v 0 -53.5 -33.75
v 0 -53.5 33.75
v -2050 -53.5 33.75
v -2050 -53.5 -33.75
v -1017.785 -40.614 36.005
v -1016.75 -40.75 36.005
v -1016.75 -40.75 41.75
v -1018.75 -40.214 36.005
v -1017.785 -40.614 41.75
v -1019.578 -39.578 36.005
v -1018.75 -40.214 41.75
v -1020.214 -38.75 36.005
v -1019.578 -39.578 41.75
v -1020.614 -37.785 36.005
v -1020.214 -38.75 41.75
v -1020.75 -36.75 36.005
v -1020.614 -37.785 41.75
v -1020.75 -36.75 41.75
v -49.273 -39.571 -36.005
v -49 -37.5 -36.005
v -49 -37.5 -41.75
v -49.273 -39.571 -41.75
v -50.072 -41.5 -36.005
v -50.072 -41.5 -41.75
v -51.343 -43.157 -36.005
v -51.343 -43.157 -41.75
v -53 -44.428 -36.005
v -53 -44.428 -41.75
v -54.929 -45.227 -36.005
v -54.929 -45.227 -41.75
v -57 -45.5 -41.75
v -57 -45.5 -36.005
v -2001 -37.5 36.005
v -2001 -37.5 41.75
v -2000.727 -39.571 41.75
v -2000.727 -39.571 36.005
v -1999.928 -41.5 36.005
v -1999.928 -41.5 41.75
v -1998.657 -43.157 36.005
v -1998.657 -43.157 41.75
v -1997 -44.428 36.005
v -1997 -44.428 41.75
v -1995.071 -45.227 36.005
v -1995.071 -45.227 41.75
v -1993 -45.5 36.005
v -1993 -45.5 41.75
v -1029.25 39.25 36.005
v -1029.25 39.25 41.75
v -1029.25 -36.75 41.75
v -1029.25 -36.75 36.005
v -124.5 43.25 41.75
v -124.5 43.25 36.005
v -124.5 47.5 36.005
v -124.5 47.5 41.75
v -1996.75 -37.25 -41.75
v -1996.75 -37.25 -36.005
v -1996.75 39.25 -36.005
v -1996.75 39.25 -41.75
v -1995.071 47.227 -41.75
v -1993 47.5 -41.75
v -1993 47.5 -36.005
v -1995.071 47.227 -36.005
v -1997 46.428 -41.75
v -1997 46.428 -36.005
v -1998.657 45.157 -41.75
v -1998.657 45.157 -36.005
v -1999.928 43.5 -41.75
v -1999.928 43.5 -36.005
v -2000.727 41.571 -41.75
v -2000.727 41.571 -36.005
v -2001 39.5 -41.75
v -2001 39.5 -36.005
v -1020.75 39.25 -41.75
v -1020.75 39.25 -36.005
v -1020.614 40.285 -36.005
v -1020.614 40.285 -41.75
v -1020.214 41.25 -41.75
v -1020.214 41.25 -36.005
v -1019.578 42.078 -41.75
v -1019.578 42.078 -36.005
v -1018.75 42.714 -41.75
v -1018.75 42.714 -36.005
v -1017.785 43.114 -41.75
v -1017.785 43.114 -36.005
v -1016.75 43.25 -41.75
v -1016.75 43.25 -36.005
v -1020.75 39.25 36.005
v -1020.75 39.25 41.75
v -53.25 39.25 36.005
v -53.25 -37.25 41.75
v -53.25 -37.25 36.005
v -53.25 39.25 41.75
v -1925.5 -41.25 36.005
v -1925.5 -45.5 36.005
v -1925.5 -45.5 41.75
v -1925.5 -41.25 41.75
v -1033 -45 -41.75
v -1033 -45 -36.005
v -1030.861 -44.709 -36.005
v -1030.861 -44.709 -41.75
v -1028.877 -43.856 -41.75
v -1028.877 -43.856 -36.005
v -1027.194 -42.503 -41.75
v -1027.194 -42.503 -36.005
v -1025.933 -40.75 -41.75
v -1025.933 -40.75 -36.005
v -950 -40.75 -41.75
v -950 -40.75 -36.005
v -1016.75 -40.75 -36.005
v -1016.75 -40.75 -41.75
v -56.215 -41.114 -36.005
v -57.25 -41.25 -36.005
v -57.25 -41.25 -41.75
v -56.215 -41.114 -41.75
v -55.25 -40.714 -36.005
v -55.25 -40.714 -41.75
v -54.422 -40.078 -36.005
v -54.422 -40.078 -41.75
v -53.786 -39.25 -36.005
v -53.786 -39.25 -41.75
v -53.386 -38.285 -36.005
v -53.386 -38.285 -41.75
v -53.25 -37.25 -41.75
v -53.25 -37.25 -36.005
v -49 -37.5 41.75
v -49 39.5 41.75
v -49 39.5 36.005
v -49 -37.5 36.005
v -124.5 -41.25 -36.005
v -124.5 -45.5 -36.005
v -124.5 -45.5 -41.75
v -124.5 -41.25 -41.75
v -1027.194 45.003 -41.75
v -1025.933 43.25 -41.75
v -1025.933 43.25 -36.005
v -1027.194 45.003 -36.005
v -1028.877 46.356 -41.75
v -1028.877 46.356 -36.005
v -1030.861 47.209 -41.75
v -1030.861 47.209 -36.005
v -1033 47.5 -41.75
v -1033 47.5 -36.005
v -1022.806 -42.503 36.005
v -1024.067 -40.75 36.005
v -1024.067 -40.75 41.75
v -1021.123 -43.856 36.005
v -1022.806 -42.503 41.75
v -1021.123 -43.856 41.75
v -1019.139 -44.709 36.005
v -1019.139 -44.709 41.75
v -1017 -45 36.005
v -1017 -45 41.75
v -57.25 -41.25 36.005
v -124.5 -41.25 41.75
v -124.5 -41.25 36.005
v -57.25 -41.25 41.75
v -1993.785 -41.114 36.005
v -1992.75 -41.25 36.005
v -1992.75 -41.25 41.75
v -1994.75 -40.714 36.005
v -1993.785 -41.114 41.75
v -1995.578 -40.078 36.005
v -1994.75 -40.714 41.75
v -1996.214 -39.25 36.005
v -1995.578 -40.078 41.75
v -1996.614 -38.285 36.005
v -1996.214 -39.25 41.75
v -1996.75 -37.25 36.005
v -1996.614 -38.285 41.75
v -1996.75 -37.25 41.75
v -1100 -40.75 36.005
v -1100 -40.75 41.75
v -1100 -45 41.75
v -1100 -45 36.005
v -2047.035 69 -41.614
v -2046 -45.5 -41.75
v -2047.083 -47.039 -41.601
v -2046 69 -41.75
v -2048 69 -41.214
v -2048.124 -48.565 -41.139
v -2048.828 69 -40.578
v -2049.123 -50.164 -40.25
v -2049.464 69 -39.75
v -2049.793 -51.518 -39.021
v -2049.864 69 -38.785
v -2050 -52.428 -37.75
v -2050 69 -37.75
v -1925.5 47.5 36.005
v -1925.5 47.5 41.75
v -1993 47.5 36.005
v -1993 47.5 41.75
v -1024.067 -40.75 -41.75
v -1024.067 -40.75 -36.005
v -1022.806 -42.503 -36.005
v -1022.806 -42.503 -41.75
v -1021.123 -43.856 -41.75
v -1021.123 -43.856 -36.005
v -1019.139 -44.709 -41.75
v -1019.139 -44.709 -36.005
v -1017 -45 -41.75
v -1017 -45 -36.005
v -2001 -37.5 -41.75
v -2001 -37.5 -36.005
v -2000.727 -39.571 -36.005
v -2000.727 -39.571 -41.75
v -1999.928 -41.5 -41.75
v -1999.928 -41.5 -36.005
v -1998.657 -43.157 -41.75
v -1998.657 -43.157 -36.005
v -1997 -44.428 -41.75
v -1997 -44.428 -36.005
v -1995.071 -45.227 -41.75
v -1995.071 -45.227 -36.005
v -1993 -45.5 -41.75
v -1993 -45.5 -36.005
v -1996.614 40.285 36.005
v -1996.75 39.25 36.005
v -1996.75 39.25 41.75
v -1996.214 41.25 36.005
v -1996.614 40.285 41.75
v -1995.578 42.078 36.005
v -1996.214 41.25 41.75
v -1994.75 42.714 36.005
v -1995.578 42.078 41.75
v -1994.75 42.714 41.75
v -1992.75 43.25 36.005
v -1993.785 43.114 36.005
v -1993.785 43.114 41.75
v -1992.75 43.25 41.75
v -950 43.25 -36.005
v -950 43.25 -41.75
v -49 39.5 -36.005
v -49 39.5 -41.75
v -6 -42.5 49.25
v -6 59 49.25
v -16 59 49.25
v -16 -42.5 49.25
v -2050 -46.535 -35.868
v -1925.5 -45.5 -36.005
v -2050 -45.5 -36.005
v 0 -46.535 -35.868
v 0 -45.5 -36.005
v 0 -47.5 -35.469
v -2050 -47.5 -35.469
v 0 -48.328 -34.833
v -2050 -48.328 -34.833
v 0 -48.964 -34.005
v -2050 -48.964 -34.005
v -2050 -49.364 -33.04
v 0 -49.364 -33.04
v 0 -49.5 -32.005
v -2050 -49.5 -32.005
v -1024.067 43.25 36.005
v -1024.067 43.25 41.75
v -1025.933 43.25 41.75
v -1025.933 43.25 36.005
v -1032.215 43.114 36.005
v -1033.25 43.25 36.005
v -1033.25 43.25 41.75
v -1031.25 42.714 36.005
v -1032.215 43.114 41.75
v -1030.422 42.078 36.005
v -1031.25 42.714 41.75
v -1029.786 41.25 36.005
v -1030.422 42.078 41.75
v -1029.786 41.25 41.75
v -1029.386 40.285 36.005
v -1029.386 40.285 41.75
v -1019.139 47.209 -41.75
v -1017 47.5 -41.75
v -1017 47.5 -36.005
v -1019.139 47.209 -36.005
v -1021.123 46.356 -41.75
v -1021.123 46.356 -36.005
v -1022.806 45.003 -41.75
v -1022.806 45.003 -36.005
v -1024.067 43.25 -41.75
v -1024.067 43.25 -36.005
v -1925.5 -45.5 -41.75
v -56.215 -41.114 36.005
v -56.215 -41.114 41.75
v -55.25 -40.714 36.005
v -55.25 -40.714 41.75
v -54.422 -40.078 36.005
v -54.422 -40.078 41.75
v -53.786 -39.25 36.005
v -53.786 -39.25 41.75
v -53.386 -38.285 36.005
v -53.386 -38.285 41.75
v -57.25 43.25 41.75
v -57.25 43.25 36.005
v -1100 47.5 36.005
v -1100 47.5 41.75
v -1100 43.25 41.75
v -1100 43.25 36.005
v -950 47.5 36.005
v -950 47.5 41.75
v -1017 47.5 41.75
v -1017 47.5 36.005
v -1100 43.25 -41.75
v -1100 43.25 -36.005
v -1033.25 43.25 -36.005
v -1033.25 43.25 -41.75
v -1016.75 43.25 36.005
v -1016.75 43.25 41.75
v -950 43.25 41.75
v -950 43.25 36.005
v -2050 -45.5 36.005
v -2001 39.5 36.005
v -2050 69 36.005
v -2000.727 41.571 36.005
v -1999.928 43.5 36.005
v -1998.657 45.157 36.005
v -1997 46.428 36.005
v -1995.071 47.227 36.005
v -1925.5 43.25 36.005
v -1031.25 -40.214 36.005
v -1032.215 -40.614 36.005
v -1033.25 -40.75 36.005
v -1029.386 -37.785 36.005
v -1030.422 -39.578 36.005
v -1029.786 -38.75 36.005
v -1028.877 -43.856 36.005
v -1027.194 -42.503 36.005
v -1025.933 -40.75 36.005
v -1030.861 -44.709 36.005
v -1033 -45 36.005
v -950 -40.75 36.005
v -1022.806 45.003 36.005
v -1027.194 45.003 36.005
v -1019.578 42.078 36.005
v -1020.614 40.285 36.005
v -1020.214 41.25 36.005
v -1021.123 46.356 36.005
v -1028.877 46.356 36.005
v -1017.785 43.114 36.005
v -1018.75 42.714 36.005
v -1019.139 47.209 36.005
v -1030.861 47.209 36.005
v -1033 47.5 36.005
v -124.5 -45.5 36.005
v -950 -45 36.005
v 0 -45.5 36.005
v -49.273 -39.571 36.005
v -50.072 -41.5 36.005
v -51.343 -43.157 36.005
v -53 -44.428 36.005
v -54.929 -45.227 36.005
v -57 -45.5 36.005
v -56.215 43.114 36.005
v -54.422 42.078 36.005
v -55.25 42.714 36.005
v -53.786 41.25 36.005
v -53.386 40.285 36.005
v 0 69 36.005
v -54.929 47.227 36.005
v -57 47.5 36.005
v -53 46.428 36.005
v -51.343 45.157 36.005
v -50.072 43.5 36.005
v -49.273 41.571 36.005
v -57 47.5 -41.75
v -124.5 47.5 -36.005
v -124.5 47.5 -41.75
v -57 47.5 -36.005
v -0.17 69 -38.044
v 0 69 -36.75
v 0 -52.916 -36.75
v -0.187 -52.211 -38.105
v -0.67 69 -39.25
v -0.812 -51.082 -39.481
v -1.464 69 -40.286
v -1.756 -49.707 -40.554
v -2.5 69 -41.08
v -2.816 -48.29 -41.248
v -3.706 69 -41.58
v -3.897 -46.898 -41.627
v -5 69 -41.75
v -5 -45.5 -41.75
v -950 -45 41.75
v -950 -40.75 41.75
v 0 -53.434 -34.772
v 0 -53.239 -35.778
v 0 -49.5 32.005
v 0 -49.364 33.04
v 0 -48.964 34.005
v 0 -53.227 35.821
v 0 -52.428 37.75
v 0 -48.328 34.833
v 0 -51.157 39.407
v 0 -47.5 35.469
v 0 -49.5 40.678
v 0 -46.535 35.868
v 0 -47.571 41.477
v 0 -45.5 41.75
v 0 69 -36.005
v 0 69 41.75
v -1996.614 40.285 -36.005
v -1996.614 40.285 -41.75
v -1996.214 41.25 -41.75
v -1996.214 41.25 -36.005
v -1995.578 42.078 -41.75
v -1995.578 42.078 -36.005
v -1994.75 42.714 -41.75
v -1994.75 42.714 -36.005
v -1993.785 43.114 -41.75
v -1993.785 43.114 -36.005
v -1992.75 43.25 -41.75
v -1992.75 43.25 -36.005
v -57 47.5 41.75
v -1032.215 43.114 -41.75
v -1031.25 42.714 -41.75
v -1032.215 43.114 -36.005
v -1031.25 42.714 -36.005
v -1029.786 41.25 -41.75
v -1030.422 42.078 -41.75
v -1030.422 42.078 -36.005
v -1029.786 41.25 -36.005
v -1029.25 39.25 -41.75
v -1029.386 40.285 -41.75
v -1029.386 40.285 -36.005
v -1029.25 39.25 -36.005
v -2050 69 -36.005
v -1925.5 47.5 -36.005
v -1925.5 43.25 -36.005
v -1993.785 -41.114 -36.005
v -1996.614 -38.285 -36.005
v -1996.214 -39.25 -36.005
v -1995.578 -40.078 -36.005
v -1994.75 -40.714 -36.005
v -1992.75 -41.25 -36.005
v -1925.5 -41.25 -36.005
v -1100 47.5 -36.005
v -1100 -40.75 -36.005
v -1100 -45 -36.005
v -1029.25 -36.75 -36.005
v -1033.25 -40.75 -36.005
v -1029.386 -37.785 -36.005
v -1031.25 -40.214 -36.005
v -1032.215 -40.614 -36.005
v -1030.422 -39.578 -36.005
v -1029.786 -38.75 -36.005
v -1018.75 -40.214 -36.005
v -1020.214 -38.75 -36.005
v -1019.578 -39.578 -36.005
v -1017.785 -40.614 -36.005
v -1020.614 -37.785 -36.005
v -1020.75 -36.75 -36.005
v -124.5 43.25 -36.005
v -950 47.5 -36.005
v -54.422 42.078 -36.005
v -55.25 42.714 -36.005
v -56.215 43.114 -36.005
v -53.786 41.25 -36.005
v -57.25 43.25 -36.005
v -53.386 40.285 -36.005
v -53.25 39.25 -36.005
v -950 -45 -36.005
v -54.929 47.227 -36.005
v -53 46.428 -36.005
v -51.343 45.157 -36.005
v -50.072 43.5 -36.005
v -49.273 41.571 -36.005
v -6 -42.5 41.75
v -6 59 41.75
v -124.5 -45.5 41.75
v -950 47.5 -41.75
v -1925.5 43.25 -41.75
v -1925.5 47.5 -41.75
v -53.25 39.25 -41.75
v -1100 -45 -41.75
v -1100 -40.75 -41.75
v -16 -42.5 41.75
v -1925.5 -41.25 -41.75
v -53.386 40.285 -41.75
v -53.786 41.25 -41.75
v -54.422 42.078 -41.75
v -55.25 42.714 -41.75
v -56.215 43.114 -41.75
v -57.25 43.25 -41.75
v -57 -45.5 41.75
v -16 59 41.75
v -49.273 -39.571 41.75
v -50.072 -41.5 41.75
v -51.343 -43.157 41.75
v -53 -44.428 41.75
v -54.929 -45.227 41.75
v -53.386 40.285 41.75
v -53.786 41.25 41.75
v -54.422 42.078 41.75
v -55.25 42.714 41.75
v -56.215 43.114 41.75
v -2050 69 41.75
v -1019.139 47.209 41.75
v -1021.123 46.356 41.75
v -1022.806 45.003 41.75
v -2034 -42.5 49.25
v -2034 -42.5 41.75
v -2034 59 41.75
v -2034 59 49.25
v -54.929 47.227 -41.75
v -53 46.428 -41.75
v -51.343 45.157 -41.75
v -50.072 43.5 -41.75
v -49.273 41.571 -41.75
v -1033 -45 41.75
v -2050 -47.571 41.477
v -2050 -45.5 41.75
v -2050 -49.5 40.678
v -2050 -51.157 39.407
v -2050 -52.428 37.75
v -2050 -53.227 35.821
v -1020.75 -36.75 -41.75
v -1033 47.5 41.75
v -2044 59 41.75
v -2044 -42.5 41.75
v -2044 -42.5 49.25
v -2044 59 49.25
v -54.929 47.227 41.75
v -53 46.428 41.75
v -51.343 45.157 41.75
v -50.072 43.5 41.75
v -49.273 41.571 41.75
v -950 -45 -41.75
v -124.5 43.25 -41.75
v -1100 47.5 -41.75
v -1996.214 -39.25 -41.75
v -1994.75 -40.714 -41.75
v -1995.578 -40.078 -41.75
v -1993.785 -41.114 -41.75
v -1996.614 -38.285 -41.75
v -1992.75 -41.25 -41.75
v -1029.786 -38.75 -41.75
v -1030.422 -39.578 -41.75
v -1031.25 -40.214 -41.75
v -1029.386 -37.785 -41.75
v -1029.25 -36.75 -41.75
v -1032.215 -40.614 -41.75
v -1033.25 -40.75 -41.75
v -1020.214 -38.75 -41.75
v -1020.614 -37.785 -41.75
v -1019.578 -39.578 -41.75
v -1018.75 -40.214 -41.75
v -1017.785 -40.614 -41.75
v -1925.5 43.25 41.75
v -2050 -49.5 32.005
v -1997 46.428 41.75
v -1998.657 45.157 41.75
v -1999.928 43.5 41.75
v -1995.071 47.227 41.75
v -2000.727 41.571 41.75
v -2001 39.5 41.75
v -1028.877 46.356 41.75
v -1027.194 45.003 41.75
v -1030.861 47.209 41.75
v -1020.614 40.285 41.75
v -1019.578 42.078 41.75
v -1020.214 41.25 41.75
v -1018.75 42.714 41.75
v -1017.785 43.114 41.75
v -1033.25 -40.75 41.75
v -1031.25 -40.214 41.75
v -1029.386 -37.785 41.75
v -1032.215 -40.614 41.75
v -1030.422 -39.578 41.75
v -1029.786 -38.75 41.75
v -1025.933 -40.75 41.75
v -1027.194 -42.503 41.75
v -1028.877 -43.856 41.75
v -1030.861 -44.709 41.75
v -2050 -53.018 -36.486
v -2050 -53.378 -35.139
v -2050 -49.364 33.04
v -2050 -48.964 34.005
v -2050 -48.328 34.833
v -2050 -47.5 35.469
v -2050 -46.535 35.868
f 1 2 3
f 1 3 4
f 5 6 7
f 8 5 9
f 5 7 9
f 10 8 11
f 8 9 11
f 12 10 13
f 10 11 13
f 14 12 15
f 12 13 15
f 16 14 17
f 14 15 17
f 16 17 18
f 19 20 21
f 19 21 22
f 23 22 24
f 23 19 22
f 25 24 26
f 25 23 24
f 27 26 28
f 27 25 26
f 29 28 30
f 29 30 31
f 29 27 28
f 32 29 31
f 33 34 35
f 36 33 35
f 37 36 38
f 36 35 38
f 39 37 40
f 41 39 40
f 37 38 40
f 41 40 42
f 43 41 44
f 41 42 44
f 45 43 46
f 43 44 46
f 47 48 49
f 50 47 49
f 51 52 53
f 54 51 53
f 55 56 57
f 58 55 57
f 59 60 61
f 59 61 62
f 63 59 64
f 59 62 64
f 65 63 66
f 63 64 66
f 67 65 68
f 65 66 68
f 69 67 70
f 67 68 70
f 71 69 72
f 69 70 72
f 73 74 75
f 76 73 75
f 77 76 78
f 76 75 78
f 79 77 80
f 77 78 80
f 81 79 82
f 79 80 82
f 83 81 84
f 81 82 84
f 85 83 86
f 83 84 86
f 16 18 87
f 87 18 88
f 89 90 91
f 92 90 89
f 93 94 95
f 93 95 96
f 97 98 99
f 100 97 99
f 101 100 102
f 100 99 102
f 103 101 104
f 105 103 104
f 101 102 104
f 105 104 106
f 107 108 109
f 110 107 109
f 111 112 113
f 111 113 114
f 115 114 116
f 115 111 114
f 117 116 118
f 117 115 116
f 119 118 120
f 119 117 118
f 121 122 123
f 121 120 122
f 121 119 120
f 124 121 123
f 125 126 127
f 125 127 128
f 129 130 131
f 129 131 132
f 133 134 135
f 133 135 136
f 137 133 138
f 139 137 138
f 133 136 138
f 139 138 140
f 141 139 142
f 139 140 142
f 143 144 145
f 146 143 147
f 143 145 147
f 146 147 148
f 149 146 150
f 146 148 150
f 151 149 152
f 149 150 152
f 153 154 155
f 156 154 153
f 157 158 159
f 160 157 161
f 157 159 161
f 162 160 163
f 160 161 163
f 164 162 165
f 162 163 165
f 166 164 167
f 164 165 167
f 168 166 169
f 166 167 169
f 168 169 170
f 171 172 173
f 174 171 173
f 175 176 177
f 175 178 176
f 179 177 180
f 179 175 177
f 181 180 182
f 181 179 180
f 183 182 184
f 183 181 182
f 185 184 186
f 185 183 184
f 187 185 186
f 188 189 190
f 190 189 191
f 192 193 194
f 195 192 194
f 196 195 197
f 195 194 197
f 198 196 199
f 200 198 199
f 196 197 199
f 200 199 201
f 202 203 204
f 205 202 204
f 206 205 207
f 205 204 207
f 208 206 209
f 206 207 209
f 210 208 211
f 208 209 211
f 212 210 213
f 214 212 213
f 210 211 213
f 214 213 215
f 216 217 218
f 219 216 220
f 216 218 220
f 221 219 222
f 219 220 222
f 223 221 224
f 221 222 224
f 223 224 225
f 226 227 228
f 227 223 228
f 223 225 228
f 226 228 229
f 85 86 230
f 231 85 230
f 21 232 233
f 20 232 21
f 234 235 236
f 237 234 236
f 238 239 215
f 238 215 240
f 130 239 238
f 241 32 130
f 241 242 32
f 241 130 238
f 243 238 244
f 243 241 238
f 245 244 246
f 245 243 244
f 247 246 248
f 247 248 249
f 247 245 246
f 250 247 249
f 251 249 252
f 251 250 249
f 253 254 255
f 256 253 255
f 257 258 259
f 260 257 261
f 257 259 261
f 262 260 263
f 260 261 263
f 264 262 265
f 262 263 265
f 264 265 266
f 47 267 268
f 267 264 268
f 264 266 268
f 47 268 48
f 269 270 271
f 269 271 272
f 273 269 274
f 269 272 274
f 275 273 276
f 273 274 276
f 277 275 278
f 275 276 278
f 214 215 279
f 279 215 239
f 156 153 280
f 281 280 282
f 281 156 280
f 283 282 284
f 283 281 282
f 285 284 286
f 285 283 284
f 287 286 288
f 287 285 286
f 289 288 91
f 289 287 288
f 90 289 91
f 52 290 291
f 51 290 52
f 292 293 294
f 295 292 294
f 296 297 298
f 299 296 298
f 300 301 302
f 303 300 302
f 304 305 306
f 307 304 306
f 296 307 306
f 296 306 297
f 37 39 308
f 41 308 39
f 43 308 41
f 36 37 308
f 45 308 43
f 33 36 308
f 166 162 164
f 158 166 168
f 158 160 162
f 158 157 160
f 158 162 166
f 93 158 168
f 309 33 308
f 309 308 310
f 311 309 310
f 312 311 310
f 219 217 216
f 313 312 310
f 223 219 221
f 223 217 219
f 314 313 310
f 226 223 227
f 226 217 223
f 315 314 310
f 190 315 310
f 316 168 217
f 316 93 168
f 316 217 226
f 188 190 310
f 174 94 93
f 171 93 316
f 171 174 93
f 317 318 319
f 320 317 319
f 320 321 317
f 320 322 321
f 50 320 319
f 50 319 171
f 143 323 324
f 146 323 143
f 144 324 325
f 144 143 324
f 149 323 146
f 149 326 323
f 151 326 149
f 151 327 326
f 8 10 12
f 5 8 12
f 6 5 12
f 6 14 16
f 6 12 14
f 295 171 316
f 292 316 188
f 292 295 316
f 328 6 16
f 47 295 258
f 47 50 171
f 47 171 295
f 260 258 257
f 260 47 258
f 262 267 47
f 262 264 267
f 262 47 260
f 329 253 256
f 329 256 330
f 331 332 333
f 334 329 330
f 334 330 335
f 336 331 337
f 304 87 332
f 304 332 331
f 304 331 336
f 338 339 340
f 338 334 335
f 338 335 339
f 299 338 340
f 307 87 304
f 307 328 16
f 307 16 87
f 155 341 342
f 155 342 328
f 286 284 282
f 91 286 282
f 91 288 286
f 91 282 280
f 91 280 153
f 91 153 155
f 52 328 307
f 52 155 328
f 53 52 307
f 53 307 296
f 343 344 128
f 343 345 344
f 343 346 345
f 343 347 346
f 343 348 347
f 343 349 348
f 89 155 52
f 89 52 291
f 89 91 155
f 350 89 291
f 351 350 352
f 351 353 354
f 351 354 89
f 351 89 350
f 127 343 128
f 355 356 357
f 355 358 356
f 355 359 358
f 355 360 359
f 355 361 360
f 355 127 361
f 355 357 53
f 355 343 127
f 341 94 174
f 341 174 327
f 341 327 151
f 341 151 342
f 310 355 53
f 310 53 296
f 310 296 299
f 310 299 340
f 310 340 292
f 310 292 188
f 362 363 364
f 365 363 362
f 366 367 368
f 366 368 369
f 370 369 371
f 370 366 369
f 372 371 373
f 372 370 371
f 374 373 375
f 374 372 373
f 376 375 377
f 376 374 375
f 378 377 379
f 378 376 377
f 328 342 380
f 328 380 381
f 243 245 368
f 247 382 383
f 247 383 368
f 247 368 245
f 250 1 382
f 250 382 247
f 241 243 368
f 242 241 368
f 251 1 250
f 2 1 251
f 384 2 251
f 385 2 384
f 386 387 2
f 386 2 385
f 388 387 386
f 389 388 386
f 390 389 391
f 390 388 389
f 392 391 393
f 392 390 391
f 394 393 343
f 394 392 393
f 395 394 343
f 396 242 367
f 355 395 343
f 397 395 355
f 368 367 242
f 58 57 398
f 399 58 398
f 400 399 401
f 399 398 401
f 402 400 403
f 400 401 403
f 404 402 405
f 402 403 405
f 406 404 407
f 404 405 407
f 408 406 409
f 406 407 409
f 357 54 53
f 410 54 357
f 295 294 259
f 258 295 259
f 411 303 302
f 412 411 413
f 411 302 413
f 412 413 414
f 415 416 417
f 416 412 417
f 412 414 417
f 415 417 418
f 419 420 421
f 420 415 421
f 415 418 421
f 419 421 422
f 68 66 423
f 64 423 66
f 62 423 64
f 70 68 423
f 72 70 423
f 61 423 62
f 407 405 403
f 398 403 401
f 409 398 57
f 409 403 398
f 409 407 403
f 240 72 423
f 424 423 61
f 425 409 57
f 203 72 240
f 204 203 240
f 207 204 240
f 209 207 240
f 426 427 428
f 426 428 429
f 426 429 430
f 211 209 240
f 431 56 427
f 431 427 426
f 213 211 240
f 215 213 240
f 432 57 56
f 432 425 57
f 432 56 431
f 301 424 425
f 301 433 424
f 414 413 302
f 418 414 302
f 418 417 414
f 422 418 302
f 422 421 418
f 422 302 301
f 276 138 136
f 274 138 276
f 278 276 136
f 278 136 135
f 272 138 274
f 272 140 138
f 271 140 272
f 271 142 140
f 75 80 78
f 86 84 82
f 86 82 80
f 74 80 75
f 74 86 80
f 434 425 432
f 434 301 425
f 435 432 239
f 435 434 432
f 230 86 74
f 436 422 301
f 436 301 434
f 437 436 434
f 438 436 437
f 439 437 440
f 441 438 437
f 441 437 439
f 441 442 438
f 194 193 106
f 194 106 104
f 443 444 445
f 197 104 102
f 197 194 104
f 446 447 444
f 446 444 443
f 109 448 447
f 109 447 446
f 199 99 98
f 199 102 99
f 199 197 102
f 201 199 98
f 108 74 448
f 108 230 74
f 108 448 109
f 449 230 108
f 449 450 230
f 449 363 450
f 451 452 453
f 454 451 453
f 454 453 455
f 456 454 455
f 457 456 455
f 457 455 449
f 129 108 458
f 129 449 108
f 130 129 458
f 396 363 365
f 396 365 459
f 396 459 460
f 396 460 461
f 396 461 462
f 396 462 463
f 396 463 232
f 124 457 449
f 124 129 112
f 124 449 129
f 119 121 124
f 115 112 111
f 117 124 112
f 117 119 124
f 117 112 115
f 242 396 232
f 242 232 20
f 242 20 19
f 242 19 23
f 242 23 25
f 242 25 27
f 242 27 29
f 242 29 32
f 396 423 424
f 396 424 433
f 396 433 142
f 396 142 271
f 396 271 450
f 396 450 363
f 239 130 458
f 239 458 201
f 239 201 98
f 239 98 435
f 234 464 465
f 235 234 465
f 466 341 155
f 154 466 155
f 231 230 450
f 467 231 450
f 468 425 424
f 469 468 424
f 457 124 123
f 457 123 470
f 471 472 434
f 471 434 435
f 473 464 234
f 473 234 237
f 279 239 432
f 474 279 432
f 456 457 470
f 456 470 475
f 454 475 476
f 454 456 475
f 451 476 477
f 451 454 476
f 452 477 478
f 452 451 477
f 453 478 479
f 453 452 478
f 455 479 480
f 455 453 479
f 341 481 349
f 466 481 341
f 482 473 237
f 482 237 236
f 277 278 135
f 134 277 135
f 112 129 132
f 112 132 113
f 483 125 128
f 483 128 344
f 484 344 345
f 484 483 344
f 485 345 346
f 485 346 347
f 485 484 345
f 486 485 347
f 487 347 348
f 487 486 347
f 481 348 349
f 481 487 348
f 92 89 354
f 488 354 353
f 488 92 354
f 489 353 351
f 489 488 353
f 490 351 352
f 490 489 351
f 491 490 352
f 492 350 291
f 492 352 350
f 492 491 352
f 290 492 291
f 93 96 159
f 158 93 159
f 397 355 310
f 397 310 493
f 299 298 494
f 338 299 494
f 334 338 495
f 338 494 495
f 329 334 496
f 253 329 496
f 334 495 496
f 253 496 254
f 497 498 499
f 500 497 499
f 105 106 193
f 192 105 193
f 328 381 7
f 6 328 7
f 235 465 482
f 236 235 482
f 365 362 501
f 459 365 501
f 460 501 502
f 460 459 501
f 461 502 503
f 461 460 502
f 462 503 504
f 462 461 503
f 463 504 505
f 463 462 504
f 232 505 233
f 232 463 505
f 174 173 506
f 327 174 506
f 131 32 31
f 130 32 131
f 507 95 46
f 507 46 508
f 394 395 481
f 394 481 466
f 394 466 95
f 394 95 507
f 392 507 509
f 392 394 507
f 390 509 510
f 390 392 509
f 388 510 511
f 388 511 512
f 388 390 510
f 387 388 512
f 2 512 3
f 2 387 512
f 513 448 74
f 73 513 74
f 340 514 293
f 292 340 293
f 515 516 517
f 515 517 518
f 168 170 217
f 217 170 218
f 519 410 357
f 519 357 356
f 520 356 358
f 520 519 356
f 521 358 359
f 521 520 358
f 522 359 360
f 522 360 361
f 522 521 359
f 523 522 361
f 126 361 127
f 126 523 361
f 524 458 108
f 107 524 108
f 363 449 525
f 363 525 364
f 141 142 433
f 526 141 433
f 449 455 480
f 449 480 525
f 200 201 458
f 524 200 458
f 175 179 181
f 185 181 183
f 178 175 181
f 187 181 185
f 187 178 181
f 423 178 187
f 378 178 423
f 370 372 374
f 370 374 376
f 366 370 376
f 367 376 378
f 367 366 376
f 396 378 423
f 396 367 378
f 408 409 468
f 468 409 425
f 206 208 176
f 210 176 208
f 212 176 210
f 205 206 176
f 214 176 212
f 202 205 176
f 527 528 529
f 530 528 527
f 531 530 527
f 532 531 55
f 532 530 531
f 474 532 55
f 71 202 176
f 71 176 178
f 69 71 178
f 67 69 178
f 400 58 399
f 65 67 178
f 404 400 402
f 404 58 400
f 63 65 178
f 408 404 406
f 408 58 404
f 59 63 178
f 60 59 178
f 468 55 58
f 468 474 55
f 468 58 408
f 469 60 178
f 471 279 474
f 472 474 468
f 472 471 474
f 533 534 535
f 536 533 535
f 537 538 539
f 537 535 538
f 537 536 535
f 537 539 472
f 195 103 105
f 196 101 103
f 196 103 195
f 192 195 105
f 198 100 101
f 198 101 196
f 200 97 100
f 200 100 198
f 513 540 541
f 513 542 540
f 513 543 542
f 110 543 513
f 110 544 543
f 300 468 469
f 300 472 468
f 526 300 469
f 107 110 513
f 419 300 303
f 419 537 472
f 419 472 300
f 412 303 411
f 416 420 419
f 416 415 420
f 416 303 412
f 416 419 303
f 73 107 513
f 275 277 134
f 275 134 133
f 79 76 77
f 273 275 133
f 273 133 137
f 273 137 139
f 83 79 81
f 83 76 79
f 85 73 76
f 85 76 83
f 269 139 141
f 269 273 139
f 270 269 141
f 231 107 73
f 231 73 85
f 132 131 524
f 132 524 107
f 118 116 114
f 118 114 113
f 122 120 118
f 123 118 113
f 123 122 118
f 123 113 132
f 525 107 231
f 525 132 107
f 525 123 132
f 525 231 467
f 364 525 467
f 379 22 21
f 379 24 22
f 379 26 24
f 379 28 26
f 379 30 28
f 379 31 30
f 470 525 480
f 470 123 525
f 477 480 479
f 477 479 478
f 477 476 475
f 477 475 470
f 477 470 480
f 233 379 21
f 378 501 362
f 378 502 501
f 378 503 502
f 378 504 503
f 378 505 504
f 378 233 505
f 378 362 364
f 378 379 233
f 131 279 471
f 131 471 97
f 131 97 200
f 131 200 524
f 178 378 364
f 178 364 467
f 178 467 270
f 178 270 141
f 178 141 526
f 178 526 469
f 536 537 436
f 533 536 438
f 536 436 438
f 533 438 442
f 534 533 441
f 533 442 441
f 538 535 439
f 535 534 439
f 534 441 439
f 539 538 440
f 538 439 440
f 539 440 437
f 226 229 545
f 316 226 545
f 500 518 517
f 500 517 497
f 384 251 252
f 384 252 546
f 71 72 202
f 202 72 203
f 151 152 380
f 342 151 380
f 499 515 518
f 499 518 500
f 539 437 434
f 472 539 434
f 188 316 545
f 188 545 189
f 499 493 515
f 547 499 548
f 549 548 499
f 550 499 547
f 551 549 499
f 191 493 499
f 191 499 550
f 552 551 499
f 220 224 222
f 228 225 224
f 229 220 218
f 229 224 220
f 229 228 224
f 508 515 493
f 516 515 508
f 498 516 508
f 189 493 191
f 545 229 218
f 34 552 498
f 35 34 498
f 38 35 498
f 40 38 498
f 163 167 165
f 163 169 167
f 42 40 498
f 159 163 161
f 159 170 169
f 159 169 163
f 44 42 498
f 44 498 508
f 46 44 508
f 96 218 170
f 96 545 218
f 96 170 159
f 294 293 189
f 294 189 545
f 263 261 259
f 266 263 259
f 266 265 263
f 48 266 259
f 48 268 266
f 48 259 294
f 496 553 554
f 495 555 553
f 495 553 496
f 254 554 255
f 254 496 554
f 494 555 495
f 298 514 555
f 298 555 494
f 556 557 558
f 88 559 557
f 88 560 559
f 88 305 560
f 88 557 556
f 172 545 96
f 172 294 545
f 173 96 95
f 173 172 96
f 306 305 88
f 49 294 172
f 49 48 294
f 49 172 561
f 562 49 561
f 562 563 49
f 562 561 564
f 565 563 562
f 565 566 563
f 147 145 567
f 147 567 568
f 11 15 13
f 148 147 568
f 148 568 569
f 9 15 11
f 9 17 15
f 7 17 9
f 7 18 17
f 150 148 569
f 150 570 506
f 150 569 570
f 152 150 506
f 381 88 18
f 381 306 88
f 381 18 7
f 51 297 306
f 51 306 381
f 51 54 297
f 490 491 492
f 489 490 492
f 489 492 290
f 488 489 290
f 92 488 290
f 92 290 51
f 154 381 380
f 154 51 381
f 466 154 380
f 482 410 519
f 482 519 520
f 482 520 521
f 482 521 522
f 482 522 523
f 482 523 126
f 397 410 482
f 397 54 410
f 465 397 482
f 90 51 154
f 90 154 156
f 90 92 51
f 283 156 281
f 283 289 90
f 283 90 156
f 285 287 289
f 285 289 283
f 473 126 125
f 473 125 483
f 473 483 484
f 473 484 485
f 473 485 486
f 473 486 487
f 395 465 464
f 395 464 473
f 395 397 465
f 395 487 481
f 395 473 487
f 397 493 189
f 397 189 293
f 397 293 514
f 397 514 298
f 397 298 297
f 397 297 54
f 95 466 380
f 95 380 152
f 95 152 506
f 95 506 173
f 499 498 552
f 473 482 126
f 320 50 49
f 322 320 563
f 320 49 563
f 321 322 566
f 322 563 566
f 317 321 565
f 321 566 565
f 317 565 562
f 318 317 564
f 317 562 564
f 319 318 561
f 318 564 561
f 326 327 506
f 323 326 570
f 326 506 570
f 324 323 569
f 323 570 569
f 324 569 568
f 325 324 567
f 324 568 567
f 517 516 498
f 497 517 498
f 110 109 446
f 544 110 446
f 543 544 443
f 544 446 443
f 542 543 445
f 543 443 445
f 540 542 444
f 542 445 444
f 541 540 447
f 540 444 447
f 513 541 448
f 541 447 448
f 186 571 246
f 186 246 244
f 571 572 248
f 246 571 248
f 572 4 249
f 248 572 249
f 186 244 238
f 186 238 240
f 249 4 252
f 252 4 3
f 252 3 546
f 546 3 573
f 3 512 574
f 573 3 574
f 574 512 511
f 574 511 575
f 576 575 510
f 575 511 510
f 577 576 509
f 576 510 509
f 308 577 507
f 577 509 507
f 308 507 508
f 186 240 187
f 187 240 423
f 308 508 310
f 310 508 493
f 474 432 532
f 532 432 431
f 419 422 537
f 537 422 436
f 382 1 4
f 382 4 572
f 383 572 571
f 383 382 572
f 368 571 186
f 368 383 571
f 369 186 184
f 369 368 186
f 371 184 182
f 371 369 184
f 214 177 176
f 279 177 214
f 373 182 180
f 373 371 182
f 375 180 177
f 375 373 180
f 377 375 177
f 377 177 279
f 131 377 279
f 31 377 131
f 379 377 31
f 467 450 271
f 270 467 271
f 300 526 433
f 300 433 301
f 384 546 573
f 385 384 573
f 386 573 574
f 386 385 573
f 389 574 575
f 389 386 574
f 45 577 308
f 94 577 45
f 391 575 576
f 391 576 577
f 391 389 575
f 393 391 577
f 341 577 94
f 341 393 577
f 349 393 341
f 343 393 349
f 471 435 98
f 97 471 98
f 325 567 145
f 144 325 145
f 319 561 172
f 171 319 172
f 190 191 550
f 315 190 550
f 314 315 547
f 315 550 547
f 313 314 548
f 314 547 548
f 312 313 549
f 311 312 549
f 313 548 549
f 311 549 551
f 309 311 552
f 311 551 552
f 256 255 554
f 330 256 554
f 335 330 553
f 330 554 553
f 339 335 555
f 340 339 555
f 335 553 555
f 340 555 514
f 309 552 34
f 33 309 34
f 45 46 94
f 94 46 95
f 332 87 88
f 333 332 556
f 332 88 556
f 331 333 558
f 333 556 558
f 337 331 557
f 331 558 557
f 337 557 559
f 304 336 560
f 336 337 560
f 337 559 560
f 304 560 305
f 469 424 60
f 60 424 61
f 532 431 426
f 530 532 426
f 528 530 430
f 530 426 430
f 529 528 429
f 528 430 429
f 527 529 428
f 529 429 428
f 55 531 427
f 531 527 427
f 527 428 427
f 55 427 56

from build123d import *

# Parameters (mm, degrees)
F0_W         = 69
F0_H         = 5.7454954955
F1_DEPTH     = 2050
F2_W         = 10
F2_H         = 101.5
F3_DEPTH     = 7.5
F7_DEPTH     = 84
F10_DEPTH    = 90
F11_T1_DEPTH = 134.5
F12_T1_DEPTH = 139.5


# Not quite as in the source:
# - a fillet or chamfer that OpenCascade refuses, or shapes differently, is made with other operations: its cross-section is extruded or revolved along the edge and cut away or added


with BuildPart() as f1:
    # F0 (on Right) → F1 (new body)
    with BuildSketch(Plane.YZ):
        with BuildLine():
            ThreePointArc((-53.5, -33.75), (-51.1568542495, -39.4068542495), (-45.5, -41.75))
            Line((-45.5, -41.75), (0, -41.75))
            Line((0, -41.75), (0, -36.0045045045))
            Line((0, -36.0045045045), (-45.5, -36.0045045045))
            ThreePointArc((-45.5, -36.0045045045), (-48.3284271247, -34.8329316293), (-49.5, -32.0045045045))
            Line((-49.5, -32.0045045045), (-49.5, 32.0045045045))
            ThreePointArc((-49.5, 32.0045045045), (-48.3284271247, 34.8329316293), (-45.5, 36.0045045045))
            Line((-45.5, 36.0045045045), (0, 36.0045045045))
            Line((0, 36.0045045045), (0, 41.75))
            Line((0, 41.75), (-45.5, 41.75))
            ThreePointArc((-45.5, 41.75), (-51.1568542495, 39.4068542495), (-53.5, 33.75))
            Line((-53.5, 33.75), (-53.5, -33.75))
        make_face()
        with Locations((34.5, 38.8772522523)):
            Rectangle(F0_W, F0_H)
        with Locations((34.5, -38.8772522523)):
            Rectangle(F0_W, F0_H)
    extrude(amount=-F1_DEPTH)

    # F2 (on face) → F3 (join)
    with BuildSketch(Plane.XY.offset(41.75)):
        with Locations((-2039, 8.25)):
            Rectangle(F2_W, F2_H)
    extrude(amount=F3_DEPTH)

    # F5: F1 across plane


with BuildPart() as f1_1:
    add(f1.part)
    add(f1.part.mirror(Plane.YZ.offset(-1025)))

    # F6 (on face) → F7 (cut)
    with BuildSketch(Plane.XY.offset(41.75)):
        with BuildLine():
            Line((-2001, 39.5), (-2001, 0))
            Line((-2001, 0), (-2001, -37.5))
            ThreePointArc((-2001, -37.5), (-1998.6568542495, -43.1568542495), (-1993, -45.5))
            Line((-1993, -45.5), (-1925.5, -45.5))
            Line((-1925.5, -45.5), (-1925.5, -41.25))
            Line((-1925.5, -41.25), (-1984.9698543549, -41.25))
            Line((-1984.9698543549, -41.25), (-1992.75, -41.25))
            ThreePointArc((-1992.75, -41.25), (-1995.5784271247, -40.0784271247), (-1996.75, -37.25))
            Line((-1996.75, -37.25), (-1996.75, 0))
            Line((-1996.75, 0), (-1996.75, 39.25))
            ThreePointArc((-1996.75, 39.25), (-1995.5784271247, 42.0784271247), (-1992.75, 43.25))
            Line((-1992.75, 43.25), (-1925.5, 43.25))
            Line((-1925.5, 43.25), (-1925.5, 47.5))
            Line((-1925.5, 47.5), (-1993, 47.5))
            ThreePointArc((-1993, 47.5), (-1998.6568542495, 45.1568542495), (-2001, 39.5))
        make_face()
    extrude(amount=-F7_DEPTH, mode=Mode.SUBTRACT)

    # F8: F1 across plane


with BuildPart() as f1_2:
    add(f1_1.part)
    add(f1_1.part.mirror(Plane.YZ.offset(-1025)), mode=Mode.INTERSECT)

    # F9 (on face) → F10 (cut)
    with BuildSketch(Plane.XY.offset(41.75)):
        with BuildLine():
            ThreePointArc((-1024.0666470126, -40.75), (-1021.1231056256, -43.8556546004), (-1017, -45))
            Line((-1017, -45), (-950, -45))
            Line((-950, -45), (-950, -40.75))
            Line((-950, -40.75), (-1016.75, -40.75))
            ThreePointArc((-1016.75, -40.75), (-1019.5784271247, -39.5784271247), (-1020.75, -36.75))
            Line((-1020.75, -36.75), (-1020.75, 1.25))
            Line((-1020.75, 1.25), (-1020.75, 39.25))
            ThreePointArc((-1020.75, 39.25), (-1019.5784271247, 42.0784271247), (-1016.75, 43.25))
            Line((-1016.75, 43.25), (-950, 43.25))
            Line((-950, 43.25), (-950, 47.5))
            Line((-950, 47.5), (-1017, 47.5))
            ThreePointArc((-1017, 47.5), (-1021.1231056256, 46.3556546004), (-1024.0666470126, 43.25))
            Line((-1024.0666470126, 43.25), (-1025.9333529874, 43.25))
            ThreePointArc((-1025.9333529874, 43.25), (-1028.8768943744, 46.3556546004), (-1033, 47.5))
            Line((-1033, 47.5), (-1100, 47.5))
            Line((-1100, 47.5), (-1100, 43.25))
            Line((-1100, 43.25), (-1033.25, 43.25))
            ThreePointArc((-1033.25, 43.25), (-1030.4215728753, 42.0784271247), (-1029.25, 39.25))
            Line((-1029.25, 39.25), (-1029.25, 1.25))
            Line((-1029.25, 1.25), (-1029.25, -36.75))
            ThreePointArc((-1029.25, -36.75), (-1030.4215728753, -39.5784271247), (-1033.25, -40.75))
            Line((-1033.25, -40.75), (-1100, -40.75))
            Line((-1100, -40.75), (-1100, -45))
            Line((-1100, -45), (-1033, -45))
            ThreePointArc((-1033, -45), (-1028.8768943744, -43.8556546004), (-1025.9333529874, -40.75))
            Line((-1025.9333529874, -40.75), (-1024.0666470126, -40.75))
        make_face()
    extrude(amount=-F10_DEPTH, mode=Mode.SUBTRACT)

    # F11: fillet of radius 4 on 1 edges, made by hand

    # F11_s2 → F11_t1 (cut)
    with BuildSketch(Plane.XZ.offset(-79)):
        with BuildLine():
            ThreePointArc((-2046, -41.75), (-2048.8284271247, -40.5784271247), (-2050, -37.75))
            Line((-2050, -37.75), (-2050, -41.75))
            Line((-2050, -41.75), (-2046, -41.75))
        make_face()
    extrude(amount=F11_T1_DEPTH, mode=Mode.SUBTRACT)

    # F12: fillet of radius 5 on 1 edges, made by hand

    # F12_s2 → F12_t1 (cut)
    with BuildSketch(Plane.XZ.offset(-81.5)):
        with BuildLine():
            ThreePointArc((0, -36.75), (-1.4644660941, -40.2855339059), (-5, -41.75))
            Line((-5, -41.75), (0, -41.75))
            Line((0, -41.75), (0, -36.75))
        make_face()
    extrude(amount=F12_T1_DEPTH, mode=Mode.SUBTRACT)


solid = f1_2.part
